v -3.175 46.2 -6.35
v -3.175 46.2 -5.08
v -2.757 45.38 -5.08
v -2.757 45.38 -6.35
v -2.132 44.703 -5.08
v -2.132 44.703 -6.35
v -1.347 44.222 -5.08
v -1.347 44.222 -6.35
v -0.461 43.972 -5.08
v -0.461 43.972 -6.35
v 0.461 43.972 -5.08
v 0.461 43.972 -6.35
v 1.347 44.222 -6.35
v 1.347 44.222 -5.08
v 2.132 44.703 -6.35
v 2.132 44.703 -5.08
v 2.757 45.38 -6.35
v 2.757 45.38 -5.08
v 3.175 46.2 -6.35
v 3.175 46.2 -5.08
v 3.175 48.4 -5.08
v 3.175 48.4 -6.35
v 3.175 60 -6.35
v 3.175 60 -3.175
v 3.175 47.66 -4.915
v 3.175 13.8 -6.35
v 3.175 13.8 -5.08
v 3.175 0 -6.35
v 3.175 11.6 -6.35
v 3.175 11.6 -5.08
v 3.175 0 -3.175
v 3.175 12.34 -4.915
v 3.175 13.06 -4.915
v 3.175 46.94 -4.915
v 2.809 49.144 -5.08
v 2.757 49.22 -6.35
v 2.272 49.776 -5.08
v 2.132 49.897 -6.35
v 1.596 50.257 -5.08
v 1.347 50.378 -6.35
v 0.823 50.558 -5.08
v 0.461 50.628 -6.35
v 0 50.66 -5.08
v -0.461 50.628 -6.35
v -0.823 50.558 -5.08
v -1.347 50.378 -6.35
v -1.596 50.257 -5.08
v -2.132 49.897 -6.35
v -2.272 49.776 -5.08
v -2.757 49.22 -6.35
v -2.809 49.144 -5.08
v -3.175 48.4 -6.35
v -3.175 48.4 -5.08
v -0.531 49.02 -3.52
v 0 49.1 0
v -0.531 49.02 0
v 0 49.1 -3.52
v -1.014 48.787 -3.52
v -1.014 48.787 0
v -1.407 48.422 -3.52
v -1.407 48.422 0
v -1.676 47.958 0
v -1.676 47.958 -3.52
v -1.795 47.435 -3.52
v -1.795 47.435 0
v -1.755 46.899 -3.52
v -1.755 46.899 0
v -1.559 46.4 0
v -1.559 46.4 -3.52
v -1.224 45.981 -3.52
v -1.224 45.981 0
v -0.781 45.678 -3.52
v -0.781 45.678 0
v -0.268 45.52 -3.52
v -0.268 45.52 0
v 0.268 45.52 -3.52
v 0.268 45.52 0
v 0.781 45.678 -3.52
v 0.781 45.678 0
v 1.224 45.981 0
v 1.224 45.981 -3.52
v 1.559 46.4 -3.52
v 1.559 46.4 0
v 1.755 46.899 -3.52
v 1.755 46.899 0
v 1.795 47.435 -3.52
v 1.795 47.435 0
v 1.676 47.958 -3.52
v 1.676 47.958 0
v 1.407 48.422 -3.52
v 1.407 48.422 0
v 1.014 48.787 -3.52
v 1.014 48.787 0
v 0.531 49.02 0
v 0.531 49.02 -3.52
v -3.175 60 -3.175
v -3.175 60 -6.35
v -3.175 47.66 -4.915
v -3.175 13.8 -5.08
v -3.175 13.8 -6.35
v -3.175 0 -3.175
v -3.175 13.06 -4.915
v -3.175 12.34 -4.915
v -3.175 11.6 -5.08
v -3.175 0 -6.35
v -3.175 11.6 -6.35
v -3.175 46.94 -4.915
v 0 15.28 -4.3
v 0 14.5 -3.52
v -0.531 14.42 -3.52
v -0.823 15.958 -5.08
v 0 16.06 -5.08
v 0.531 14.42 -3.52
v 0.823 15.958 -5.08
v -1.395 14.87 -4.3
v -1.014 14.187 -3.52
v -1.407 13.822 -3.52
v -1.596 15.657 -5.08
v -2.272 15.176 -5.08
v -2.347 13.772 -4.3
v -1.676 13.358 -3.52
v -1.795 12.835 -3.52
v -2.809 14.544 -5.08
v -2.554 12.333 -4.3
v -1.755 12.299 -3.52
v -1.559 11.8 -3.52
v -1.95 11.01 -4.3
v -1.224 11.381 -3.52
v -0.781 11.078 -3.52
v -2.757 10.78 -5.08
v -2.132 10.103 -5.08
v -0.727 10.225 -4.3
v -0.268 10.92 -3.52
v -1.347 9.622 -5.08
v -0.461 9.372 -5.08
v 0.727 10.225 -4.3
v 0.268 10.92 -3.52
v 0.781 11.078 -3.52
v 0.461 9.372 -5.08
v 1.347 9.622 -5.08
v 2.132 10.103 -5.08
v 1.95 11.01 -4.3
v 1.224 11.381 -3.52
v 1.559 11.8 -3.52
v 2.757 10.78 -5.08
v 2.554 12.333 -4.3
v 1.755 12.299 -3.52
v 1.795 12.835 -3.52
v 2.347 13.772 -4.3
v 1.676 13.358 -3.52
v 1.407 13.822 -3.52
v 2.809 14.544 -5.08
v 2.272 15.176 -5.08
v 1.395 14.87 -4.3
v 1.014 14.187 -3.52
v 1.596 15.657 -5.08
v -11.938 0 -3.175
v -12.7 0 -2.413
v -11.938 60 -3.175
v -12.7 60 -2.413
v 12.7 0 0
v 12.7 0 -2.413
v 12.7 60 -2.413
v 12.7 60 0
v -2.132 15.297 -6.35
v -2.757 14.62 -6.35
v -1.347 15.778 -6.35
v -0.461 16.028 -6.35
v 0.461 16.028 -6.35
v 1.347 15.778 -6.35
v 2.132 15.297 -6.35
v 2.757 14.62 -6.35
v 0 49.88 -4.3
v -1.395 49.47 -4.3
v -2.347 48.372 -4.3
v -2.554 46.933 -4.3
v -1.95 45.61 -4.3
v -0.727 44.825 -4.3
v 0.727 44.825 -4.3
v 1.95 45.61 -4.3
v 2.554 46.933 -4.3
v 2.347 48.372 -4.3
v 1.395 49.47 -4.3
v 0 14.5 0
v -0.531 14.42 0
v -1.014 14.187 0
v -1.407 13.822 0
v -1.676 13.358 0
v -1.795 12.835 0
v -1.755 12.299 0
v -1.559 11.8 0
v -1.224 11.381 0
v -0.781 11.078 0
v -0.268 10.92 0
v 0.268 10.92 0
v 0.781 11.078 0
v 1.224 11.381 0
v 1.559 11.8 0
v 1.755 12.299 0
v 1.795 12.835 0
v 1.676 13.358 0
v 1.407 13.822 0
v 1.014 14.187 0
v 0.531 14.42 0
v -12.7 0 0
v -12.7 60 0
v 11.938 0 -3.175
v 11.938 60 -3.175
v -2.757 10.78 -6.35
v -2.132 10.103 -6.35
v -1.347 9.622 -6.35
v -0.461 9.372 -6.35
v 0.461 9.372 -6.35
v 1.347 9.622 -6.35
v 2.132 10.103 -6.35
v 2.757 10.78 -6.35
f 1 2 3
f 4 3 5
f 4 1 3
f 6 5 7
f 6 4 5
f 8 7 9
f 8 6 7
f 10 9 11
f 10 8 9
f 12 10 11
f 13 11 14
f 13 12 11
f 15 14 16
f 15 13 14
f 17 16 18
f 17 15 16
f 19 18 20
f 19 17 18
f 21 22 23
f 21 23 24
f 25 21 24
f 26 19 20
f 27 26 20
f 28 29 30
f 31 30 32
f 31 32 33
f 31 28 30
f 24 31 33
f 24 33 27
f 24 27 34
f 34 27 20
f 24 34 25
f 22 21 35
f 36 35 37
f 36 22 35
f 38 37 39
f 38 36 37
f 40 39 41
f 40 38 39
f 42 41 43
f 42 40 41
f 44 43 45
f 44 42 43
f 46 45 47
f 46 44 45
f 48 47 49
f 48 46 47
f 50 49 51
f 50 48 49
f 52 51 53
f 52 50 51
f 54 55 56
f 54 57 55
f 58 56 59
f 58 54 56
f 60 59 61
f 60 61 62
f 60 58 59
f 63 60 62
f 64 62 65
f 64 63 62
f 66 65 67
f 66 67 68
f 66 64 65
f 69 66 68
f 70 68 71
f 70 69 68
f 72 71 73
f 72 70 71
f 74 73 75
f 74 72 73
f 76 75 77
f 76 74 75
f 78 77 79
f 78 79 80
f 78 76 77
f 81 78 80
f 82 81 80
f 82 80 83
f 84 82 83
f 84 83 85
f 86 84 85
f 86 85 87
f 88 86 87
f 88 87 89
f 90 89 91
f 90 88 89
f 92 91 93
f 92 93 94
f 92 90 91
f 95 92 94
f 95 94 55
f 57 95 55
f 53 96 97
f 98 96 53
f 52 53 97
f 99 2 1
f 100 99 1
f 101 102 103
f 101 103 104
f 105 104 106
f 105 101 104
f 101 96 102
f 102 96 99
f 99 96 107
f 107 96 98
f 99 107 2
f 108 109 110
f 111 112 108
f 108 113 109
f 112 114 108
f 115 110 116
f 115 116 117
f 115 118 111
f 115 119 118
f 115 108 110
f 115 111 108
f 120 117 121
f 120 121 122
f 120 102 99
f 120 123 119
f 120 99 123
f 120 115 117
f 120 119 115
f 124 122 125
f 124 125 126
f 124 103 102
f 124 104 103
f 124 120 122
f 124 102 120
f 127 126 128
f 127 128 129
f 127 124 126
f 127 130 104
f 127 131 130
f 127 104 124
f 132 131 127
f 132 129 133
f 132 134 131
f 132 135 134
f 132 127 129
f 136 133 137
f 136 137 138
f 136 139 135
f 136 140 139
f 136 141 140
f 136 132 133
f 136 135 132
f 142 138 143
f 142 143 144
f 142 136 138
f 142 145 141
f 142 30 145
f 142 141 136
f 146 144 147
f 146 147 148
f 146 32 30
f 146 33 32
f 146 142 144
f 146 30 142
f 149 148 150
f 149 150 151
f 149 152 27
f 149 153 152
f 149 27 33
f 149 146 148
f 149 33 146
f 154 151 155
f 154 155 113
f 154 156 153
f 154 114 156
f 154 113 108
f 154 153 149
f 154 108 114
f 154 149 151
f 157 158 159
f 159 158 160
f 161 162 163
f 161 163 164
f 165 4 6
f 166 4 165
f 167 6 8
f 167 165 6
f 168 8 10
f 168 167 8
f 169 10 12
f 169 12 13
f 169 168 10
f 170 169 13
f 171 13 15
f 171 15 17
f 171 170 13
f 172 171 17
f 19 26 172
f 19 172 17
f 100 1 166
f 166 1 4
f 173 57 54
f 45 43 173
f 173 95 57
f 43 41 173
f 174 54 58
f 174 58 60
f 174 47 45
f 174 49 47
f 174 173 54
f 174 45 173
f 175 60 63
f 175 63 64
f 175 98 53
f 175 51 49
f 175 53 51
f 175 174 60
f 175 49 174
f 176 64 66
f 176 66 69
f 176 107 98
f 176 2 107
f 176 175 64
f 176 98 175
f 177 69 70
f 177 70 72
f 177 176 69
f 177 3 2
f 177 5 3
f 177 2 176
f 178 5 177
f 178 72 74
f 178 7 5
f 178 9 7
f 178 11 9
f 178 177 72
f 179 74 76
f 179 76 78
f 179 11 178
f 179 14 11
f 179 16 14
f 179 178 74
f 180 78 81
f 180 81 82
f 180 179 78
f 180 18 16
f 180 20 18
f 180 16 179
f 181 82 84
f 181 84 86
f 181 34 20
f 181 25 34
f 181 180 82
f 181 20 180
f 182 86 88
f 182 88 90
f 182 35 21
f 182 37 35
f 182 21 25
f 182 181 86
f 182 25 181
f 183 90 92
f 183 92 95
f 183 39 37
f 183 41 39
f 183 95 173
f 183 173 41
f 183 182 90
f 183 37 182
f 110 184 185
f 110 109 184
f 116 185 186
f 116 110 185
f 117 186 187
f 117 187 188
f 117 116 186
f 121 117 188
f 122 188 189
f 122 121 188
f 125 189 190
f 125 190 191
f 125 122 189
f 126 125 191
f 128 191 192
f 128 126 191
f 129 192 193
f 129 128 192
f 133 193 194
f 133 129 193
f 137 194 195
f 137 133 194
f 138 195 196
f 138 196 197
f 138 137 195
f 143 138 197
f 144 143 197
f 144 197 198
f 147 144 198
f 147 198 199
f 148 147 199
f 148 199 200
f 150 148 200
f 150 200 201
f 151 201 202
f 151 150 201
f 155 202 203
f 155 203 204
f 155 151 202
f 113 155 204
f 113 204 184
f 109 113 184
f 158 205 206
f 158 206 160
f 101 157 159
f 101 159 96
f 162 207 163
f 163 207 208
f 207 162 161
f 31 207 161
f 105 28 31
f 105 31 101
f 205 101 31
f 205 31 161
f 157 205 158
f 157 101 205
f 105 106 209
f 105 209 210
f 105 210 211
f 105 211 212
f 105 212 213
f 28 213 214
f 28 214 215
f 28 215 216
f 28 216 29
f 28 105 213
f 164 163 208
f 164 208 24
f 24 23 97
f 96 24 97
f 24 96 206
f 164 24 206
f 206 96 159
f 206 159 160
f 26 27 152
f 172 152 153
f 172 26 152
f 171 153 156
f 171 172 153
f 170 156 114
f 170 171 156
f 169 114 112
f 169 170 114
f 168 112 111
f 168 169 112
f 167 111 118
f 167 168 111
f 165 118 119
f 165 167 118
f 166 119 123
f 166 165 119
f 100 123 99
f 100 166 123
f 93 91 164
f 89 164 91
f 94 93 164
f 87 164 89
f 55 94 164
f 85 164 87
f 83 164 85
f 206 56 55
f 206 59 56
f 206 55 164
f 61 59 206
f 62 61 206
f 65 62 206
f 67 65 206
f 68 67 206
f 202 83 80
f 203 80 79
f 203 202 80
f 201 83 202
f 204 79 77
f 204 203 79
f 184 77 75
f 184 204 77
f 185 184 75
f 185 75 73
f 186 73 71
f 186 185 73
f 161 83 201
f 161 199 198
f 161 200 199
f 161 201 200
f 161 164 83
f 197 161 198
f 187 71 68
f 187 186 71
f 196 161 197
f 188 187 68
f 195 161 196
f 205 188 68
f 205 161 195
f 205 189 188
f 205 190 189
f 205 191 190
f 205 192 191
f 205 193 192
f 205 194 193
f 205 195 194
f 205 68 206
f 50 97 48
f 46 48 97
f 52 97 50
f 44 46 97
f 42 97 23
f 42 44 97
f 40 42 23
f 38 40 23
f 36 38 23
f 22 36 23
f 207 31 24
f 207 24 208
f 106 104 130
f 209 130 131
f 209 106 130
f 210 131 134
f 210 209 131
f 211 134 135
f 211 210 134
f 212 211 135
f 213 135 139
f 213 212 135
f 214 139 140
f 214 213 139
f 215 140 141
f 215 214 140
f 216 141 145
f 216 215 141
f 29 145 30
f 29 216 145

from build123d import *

# Parameters (mm, degrees)
BOSS_EXTRUDE1_DEPTH          = 60
SKETCH2_R                    = 1.5
CUT_EXTRUDE2_DEPTH           = 7.35
CSK_FOR_M3_SFHCS1_AT_2_COUNT = 2
CSK_FOR_M3_SFHCS1_AT_2_PITCH = 34.6
CHAMFER1_SIZE                = 0.762


with BuildPart() as part:
    # Sketch1 → Boss-Extrude1 (new body)
    with BuildSketch(Plane(origin=(0, 0, 0), x_dir=(1, 0, 0), z_dir=(0, 1, 0))):
        Polygon((-3.175, 6.35), (3.175, 6.35), (3.175, 3.175), (12.7, 3.175), (12.7, 0), (-12.7, 0), (-12.7, 3.175), (-3.175, 3.175), align=None)
    extrude(amount=BOSS_EXTRUDE1_DEPTH)

    # Sketch2 → Cut-Extrude2 (cut, through all)
    with BuildSketch(Plane(origin=(0, 0, -6.35), x_dir=(-1, 0, 0), z_dir=(0, 0, -1))):
        with Locations((0, 47.3)):
            Circle(SKETCH2_R)
        with Locations((0, 12.7)):
            Circle(SKETCH2_R)
    extrude(amount=-CUT_EXTRUDE2_DEPTH, mode=Mode.SUBTRACT)

    # Sketch4 → CSK for M3 SFHCS1 (revolve, cut)
    with BuildSketch(Plane(origin=(0, 12.7, -6.35), x_dir=(0, 1, 0), z_dir=(1, 0, 0))):
        Polygon((0, 0), (0, 6.35), (1.8, 6.35), (1.8, 2.83), (3.36, 1.27), (3.36, 0), align=None)
    csk_for_m3_sfhcs1 = revolve(axis=Axis((0, 12.7, -12.7), (0, 0, 1)), mode=Mode.SUBTRACT)

    # CSK for M3 SFHCS1 at 2: CSK for M3 SFHCS1 ×2
    with Locations(*[(0, i * CSK_FOR_M3_SFHCS1_AT_2_PITCH, 0) for i in range(1, CSK_FOR_M3_SFHCS1_AT_2_COUNT)]):
        add(csk_for_m3_sfhcs1, mode=Mode.SUBTRACT)

    # Chamfer1
    chamfer1_edges = [part.edges().sort_by_distance(p)[0] for p in [
        (12.7, 30, -3.175),
        (-12.7, 30, -3.175),
    ]]
    chamfer(chamfer1_edges, length=CHAMFER1_SIZE)


solid = part.part
